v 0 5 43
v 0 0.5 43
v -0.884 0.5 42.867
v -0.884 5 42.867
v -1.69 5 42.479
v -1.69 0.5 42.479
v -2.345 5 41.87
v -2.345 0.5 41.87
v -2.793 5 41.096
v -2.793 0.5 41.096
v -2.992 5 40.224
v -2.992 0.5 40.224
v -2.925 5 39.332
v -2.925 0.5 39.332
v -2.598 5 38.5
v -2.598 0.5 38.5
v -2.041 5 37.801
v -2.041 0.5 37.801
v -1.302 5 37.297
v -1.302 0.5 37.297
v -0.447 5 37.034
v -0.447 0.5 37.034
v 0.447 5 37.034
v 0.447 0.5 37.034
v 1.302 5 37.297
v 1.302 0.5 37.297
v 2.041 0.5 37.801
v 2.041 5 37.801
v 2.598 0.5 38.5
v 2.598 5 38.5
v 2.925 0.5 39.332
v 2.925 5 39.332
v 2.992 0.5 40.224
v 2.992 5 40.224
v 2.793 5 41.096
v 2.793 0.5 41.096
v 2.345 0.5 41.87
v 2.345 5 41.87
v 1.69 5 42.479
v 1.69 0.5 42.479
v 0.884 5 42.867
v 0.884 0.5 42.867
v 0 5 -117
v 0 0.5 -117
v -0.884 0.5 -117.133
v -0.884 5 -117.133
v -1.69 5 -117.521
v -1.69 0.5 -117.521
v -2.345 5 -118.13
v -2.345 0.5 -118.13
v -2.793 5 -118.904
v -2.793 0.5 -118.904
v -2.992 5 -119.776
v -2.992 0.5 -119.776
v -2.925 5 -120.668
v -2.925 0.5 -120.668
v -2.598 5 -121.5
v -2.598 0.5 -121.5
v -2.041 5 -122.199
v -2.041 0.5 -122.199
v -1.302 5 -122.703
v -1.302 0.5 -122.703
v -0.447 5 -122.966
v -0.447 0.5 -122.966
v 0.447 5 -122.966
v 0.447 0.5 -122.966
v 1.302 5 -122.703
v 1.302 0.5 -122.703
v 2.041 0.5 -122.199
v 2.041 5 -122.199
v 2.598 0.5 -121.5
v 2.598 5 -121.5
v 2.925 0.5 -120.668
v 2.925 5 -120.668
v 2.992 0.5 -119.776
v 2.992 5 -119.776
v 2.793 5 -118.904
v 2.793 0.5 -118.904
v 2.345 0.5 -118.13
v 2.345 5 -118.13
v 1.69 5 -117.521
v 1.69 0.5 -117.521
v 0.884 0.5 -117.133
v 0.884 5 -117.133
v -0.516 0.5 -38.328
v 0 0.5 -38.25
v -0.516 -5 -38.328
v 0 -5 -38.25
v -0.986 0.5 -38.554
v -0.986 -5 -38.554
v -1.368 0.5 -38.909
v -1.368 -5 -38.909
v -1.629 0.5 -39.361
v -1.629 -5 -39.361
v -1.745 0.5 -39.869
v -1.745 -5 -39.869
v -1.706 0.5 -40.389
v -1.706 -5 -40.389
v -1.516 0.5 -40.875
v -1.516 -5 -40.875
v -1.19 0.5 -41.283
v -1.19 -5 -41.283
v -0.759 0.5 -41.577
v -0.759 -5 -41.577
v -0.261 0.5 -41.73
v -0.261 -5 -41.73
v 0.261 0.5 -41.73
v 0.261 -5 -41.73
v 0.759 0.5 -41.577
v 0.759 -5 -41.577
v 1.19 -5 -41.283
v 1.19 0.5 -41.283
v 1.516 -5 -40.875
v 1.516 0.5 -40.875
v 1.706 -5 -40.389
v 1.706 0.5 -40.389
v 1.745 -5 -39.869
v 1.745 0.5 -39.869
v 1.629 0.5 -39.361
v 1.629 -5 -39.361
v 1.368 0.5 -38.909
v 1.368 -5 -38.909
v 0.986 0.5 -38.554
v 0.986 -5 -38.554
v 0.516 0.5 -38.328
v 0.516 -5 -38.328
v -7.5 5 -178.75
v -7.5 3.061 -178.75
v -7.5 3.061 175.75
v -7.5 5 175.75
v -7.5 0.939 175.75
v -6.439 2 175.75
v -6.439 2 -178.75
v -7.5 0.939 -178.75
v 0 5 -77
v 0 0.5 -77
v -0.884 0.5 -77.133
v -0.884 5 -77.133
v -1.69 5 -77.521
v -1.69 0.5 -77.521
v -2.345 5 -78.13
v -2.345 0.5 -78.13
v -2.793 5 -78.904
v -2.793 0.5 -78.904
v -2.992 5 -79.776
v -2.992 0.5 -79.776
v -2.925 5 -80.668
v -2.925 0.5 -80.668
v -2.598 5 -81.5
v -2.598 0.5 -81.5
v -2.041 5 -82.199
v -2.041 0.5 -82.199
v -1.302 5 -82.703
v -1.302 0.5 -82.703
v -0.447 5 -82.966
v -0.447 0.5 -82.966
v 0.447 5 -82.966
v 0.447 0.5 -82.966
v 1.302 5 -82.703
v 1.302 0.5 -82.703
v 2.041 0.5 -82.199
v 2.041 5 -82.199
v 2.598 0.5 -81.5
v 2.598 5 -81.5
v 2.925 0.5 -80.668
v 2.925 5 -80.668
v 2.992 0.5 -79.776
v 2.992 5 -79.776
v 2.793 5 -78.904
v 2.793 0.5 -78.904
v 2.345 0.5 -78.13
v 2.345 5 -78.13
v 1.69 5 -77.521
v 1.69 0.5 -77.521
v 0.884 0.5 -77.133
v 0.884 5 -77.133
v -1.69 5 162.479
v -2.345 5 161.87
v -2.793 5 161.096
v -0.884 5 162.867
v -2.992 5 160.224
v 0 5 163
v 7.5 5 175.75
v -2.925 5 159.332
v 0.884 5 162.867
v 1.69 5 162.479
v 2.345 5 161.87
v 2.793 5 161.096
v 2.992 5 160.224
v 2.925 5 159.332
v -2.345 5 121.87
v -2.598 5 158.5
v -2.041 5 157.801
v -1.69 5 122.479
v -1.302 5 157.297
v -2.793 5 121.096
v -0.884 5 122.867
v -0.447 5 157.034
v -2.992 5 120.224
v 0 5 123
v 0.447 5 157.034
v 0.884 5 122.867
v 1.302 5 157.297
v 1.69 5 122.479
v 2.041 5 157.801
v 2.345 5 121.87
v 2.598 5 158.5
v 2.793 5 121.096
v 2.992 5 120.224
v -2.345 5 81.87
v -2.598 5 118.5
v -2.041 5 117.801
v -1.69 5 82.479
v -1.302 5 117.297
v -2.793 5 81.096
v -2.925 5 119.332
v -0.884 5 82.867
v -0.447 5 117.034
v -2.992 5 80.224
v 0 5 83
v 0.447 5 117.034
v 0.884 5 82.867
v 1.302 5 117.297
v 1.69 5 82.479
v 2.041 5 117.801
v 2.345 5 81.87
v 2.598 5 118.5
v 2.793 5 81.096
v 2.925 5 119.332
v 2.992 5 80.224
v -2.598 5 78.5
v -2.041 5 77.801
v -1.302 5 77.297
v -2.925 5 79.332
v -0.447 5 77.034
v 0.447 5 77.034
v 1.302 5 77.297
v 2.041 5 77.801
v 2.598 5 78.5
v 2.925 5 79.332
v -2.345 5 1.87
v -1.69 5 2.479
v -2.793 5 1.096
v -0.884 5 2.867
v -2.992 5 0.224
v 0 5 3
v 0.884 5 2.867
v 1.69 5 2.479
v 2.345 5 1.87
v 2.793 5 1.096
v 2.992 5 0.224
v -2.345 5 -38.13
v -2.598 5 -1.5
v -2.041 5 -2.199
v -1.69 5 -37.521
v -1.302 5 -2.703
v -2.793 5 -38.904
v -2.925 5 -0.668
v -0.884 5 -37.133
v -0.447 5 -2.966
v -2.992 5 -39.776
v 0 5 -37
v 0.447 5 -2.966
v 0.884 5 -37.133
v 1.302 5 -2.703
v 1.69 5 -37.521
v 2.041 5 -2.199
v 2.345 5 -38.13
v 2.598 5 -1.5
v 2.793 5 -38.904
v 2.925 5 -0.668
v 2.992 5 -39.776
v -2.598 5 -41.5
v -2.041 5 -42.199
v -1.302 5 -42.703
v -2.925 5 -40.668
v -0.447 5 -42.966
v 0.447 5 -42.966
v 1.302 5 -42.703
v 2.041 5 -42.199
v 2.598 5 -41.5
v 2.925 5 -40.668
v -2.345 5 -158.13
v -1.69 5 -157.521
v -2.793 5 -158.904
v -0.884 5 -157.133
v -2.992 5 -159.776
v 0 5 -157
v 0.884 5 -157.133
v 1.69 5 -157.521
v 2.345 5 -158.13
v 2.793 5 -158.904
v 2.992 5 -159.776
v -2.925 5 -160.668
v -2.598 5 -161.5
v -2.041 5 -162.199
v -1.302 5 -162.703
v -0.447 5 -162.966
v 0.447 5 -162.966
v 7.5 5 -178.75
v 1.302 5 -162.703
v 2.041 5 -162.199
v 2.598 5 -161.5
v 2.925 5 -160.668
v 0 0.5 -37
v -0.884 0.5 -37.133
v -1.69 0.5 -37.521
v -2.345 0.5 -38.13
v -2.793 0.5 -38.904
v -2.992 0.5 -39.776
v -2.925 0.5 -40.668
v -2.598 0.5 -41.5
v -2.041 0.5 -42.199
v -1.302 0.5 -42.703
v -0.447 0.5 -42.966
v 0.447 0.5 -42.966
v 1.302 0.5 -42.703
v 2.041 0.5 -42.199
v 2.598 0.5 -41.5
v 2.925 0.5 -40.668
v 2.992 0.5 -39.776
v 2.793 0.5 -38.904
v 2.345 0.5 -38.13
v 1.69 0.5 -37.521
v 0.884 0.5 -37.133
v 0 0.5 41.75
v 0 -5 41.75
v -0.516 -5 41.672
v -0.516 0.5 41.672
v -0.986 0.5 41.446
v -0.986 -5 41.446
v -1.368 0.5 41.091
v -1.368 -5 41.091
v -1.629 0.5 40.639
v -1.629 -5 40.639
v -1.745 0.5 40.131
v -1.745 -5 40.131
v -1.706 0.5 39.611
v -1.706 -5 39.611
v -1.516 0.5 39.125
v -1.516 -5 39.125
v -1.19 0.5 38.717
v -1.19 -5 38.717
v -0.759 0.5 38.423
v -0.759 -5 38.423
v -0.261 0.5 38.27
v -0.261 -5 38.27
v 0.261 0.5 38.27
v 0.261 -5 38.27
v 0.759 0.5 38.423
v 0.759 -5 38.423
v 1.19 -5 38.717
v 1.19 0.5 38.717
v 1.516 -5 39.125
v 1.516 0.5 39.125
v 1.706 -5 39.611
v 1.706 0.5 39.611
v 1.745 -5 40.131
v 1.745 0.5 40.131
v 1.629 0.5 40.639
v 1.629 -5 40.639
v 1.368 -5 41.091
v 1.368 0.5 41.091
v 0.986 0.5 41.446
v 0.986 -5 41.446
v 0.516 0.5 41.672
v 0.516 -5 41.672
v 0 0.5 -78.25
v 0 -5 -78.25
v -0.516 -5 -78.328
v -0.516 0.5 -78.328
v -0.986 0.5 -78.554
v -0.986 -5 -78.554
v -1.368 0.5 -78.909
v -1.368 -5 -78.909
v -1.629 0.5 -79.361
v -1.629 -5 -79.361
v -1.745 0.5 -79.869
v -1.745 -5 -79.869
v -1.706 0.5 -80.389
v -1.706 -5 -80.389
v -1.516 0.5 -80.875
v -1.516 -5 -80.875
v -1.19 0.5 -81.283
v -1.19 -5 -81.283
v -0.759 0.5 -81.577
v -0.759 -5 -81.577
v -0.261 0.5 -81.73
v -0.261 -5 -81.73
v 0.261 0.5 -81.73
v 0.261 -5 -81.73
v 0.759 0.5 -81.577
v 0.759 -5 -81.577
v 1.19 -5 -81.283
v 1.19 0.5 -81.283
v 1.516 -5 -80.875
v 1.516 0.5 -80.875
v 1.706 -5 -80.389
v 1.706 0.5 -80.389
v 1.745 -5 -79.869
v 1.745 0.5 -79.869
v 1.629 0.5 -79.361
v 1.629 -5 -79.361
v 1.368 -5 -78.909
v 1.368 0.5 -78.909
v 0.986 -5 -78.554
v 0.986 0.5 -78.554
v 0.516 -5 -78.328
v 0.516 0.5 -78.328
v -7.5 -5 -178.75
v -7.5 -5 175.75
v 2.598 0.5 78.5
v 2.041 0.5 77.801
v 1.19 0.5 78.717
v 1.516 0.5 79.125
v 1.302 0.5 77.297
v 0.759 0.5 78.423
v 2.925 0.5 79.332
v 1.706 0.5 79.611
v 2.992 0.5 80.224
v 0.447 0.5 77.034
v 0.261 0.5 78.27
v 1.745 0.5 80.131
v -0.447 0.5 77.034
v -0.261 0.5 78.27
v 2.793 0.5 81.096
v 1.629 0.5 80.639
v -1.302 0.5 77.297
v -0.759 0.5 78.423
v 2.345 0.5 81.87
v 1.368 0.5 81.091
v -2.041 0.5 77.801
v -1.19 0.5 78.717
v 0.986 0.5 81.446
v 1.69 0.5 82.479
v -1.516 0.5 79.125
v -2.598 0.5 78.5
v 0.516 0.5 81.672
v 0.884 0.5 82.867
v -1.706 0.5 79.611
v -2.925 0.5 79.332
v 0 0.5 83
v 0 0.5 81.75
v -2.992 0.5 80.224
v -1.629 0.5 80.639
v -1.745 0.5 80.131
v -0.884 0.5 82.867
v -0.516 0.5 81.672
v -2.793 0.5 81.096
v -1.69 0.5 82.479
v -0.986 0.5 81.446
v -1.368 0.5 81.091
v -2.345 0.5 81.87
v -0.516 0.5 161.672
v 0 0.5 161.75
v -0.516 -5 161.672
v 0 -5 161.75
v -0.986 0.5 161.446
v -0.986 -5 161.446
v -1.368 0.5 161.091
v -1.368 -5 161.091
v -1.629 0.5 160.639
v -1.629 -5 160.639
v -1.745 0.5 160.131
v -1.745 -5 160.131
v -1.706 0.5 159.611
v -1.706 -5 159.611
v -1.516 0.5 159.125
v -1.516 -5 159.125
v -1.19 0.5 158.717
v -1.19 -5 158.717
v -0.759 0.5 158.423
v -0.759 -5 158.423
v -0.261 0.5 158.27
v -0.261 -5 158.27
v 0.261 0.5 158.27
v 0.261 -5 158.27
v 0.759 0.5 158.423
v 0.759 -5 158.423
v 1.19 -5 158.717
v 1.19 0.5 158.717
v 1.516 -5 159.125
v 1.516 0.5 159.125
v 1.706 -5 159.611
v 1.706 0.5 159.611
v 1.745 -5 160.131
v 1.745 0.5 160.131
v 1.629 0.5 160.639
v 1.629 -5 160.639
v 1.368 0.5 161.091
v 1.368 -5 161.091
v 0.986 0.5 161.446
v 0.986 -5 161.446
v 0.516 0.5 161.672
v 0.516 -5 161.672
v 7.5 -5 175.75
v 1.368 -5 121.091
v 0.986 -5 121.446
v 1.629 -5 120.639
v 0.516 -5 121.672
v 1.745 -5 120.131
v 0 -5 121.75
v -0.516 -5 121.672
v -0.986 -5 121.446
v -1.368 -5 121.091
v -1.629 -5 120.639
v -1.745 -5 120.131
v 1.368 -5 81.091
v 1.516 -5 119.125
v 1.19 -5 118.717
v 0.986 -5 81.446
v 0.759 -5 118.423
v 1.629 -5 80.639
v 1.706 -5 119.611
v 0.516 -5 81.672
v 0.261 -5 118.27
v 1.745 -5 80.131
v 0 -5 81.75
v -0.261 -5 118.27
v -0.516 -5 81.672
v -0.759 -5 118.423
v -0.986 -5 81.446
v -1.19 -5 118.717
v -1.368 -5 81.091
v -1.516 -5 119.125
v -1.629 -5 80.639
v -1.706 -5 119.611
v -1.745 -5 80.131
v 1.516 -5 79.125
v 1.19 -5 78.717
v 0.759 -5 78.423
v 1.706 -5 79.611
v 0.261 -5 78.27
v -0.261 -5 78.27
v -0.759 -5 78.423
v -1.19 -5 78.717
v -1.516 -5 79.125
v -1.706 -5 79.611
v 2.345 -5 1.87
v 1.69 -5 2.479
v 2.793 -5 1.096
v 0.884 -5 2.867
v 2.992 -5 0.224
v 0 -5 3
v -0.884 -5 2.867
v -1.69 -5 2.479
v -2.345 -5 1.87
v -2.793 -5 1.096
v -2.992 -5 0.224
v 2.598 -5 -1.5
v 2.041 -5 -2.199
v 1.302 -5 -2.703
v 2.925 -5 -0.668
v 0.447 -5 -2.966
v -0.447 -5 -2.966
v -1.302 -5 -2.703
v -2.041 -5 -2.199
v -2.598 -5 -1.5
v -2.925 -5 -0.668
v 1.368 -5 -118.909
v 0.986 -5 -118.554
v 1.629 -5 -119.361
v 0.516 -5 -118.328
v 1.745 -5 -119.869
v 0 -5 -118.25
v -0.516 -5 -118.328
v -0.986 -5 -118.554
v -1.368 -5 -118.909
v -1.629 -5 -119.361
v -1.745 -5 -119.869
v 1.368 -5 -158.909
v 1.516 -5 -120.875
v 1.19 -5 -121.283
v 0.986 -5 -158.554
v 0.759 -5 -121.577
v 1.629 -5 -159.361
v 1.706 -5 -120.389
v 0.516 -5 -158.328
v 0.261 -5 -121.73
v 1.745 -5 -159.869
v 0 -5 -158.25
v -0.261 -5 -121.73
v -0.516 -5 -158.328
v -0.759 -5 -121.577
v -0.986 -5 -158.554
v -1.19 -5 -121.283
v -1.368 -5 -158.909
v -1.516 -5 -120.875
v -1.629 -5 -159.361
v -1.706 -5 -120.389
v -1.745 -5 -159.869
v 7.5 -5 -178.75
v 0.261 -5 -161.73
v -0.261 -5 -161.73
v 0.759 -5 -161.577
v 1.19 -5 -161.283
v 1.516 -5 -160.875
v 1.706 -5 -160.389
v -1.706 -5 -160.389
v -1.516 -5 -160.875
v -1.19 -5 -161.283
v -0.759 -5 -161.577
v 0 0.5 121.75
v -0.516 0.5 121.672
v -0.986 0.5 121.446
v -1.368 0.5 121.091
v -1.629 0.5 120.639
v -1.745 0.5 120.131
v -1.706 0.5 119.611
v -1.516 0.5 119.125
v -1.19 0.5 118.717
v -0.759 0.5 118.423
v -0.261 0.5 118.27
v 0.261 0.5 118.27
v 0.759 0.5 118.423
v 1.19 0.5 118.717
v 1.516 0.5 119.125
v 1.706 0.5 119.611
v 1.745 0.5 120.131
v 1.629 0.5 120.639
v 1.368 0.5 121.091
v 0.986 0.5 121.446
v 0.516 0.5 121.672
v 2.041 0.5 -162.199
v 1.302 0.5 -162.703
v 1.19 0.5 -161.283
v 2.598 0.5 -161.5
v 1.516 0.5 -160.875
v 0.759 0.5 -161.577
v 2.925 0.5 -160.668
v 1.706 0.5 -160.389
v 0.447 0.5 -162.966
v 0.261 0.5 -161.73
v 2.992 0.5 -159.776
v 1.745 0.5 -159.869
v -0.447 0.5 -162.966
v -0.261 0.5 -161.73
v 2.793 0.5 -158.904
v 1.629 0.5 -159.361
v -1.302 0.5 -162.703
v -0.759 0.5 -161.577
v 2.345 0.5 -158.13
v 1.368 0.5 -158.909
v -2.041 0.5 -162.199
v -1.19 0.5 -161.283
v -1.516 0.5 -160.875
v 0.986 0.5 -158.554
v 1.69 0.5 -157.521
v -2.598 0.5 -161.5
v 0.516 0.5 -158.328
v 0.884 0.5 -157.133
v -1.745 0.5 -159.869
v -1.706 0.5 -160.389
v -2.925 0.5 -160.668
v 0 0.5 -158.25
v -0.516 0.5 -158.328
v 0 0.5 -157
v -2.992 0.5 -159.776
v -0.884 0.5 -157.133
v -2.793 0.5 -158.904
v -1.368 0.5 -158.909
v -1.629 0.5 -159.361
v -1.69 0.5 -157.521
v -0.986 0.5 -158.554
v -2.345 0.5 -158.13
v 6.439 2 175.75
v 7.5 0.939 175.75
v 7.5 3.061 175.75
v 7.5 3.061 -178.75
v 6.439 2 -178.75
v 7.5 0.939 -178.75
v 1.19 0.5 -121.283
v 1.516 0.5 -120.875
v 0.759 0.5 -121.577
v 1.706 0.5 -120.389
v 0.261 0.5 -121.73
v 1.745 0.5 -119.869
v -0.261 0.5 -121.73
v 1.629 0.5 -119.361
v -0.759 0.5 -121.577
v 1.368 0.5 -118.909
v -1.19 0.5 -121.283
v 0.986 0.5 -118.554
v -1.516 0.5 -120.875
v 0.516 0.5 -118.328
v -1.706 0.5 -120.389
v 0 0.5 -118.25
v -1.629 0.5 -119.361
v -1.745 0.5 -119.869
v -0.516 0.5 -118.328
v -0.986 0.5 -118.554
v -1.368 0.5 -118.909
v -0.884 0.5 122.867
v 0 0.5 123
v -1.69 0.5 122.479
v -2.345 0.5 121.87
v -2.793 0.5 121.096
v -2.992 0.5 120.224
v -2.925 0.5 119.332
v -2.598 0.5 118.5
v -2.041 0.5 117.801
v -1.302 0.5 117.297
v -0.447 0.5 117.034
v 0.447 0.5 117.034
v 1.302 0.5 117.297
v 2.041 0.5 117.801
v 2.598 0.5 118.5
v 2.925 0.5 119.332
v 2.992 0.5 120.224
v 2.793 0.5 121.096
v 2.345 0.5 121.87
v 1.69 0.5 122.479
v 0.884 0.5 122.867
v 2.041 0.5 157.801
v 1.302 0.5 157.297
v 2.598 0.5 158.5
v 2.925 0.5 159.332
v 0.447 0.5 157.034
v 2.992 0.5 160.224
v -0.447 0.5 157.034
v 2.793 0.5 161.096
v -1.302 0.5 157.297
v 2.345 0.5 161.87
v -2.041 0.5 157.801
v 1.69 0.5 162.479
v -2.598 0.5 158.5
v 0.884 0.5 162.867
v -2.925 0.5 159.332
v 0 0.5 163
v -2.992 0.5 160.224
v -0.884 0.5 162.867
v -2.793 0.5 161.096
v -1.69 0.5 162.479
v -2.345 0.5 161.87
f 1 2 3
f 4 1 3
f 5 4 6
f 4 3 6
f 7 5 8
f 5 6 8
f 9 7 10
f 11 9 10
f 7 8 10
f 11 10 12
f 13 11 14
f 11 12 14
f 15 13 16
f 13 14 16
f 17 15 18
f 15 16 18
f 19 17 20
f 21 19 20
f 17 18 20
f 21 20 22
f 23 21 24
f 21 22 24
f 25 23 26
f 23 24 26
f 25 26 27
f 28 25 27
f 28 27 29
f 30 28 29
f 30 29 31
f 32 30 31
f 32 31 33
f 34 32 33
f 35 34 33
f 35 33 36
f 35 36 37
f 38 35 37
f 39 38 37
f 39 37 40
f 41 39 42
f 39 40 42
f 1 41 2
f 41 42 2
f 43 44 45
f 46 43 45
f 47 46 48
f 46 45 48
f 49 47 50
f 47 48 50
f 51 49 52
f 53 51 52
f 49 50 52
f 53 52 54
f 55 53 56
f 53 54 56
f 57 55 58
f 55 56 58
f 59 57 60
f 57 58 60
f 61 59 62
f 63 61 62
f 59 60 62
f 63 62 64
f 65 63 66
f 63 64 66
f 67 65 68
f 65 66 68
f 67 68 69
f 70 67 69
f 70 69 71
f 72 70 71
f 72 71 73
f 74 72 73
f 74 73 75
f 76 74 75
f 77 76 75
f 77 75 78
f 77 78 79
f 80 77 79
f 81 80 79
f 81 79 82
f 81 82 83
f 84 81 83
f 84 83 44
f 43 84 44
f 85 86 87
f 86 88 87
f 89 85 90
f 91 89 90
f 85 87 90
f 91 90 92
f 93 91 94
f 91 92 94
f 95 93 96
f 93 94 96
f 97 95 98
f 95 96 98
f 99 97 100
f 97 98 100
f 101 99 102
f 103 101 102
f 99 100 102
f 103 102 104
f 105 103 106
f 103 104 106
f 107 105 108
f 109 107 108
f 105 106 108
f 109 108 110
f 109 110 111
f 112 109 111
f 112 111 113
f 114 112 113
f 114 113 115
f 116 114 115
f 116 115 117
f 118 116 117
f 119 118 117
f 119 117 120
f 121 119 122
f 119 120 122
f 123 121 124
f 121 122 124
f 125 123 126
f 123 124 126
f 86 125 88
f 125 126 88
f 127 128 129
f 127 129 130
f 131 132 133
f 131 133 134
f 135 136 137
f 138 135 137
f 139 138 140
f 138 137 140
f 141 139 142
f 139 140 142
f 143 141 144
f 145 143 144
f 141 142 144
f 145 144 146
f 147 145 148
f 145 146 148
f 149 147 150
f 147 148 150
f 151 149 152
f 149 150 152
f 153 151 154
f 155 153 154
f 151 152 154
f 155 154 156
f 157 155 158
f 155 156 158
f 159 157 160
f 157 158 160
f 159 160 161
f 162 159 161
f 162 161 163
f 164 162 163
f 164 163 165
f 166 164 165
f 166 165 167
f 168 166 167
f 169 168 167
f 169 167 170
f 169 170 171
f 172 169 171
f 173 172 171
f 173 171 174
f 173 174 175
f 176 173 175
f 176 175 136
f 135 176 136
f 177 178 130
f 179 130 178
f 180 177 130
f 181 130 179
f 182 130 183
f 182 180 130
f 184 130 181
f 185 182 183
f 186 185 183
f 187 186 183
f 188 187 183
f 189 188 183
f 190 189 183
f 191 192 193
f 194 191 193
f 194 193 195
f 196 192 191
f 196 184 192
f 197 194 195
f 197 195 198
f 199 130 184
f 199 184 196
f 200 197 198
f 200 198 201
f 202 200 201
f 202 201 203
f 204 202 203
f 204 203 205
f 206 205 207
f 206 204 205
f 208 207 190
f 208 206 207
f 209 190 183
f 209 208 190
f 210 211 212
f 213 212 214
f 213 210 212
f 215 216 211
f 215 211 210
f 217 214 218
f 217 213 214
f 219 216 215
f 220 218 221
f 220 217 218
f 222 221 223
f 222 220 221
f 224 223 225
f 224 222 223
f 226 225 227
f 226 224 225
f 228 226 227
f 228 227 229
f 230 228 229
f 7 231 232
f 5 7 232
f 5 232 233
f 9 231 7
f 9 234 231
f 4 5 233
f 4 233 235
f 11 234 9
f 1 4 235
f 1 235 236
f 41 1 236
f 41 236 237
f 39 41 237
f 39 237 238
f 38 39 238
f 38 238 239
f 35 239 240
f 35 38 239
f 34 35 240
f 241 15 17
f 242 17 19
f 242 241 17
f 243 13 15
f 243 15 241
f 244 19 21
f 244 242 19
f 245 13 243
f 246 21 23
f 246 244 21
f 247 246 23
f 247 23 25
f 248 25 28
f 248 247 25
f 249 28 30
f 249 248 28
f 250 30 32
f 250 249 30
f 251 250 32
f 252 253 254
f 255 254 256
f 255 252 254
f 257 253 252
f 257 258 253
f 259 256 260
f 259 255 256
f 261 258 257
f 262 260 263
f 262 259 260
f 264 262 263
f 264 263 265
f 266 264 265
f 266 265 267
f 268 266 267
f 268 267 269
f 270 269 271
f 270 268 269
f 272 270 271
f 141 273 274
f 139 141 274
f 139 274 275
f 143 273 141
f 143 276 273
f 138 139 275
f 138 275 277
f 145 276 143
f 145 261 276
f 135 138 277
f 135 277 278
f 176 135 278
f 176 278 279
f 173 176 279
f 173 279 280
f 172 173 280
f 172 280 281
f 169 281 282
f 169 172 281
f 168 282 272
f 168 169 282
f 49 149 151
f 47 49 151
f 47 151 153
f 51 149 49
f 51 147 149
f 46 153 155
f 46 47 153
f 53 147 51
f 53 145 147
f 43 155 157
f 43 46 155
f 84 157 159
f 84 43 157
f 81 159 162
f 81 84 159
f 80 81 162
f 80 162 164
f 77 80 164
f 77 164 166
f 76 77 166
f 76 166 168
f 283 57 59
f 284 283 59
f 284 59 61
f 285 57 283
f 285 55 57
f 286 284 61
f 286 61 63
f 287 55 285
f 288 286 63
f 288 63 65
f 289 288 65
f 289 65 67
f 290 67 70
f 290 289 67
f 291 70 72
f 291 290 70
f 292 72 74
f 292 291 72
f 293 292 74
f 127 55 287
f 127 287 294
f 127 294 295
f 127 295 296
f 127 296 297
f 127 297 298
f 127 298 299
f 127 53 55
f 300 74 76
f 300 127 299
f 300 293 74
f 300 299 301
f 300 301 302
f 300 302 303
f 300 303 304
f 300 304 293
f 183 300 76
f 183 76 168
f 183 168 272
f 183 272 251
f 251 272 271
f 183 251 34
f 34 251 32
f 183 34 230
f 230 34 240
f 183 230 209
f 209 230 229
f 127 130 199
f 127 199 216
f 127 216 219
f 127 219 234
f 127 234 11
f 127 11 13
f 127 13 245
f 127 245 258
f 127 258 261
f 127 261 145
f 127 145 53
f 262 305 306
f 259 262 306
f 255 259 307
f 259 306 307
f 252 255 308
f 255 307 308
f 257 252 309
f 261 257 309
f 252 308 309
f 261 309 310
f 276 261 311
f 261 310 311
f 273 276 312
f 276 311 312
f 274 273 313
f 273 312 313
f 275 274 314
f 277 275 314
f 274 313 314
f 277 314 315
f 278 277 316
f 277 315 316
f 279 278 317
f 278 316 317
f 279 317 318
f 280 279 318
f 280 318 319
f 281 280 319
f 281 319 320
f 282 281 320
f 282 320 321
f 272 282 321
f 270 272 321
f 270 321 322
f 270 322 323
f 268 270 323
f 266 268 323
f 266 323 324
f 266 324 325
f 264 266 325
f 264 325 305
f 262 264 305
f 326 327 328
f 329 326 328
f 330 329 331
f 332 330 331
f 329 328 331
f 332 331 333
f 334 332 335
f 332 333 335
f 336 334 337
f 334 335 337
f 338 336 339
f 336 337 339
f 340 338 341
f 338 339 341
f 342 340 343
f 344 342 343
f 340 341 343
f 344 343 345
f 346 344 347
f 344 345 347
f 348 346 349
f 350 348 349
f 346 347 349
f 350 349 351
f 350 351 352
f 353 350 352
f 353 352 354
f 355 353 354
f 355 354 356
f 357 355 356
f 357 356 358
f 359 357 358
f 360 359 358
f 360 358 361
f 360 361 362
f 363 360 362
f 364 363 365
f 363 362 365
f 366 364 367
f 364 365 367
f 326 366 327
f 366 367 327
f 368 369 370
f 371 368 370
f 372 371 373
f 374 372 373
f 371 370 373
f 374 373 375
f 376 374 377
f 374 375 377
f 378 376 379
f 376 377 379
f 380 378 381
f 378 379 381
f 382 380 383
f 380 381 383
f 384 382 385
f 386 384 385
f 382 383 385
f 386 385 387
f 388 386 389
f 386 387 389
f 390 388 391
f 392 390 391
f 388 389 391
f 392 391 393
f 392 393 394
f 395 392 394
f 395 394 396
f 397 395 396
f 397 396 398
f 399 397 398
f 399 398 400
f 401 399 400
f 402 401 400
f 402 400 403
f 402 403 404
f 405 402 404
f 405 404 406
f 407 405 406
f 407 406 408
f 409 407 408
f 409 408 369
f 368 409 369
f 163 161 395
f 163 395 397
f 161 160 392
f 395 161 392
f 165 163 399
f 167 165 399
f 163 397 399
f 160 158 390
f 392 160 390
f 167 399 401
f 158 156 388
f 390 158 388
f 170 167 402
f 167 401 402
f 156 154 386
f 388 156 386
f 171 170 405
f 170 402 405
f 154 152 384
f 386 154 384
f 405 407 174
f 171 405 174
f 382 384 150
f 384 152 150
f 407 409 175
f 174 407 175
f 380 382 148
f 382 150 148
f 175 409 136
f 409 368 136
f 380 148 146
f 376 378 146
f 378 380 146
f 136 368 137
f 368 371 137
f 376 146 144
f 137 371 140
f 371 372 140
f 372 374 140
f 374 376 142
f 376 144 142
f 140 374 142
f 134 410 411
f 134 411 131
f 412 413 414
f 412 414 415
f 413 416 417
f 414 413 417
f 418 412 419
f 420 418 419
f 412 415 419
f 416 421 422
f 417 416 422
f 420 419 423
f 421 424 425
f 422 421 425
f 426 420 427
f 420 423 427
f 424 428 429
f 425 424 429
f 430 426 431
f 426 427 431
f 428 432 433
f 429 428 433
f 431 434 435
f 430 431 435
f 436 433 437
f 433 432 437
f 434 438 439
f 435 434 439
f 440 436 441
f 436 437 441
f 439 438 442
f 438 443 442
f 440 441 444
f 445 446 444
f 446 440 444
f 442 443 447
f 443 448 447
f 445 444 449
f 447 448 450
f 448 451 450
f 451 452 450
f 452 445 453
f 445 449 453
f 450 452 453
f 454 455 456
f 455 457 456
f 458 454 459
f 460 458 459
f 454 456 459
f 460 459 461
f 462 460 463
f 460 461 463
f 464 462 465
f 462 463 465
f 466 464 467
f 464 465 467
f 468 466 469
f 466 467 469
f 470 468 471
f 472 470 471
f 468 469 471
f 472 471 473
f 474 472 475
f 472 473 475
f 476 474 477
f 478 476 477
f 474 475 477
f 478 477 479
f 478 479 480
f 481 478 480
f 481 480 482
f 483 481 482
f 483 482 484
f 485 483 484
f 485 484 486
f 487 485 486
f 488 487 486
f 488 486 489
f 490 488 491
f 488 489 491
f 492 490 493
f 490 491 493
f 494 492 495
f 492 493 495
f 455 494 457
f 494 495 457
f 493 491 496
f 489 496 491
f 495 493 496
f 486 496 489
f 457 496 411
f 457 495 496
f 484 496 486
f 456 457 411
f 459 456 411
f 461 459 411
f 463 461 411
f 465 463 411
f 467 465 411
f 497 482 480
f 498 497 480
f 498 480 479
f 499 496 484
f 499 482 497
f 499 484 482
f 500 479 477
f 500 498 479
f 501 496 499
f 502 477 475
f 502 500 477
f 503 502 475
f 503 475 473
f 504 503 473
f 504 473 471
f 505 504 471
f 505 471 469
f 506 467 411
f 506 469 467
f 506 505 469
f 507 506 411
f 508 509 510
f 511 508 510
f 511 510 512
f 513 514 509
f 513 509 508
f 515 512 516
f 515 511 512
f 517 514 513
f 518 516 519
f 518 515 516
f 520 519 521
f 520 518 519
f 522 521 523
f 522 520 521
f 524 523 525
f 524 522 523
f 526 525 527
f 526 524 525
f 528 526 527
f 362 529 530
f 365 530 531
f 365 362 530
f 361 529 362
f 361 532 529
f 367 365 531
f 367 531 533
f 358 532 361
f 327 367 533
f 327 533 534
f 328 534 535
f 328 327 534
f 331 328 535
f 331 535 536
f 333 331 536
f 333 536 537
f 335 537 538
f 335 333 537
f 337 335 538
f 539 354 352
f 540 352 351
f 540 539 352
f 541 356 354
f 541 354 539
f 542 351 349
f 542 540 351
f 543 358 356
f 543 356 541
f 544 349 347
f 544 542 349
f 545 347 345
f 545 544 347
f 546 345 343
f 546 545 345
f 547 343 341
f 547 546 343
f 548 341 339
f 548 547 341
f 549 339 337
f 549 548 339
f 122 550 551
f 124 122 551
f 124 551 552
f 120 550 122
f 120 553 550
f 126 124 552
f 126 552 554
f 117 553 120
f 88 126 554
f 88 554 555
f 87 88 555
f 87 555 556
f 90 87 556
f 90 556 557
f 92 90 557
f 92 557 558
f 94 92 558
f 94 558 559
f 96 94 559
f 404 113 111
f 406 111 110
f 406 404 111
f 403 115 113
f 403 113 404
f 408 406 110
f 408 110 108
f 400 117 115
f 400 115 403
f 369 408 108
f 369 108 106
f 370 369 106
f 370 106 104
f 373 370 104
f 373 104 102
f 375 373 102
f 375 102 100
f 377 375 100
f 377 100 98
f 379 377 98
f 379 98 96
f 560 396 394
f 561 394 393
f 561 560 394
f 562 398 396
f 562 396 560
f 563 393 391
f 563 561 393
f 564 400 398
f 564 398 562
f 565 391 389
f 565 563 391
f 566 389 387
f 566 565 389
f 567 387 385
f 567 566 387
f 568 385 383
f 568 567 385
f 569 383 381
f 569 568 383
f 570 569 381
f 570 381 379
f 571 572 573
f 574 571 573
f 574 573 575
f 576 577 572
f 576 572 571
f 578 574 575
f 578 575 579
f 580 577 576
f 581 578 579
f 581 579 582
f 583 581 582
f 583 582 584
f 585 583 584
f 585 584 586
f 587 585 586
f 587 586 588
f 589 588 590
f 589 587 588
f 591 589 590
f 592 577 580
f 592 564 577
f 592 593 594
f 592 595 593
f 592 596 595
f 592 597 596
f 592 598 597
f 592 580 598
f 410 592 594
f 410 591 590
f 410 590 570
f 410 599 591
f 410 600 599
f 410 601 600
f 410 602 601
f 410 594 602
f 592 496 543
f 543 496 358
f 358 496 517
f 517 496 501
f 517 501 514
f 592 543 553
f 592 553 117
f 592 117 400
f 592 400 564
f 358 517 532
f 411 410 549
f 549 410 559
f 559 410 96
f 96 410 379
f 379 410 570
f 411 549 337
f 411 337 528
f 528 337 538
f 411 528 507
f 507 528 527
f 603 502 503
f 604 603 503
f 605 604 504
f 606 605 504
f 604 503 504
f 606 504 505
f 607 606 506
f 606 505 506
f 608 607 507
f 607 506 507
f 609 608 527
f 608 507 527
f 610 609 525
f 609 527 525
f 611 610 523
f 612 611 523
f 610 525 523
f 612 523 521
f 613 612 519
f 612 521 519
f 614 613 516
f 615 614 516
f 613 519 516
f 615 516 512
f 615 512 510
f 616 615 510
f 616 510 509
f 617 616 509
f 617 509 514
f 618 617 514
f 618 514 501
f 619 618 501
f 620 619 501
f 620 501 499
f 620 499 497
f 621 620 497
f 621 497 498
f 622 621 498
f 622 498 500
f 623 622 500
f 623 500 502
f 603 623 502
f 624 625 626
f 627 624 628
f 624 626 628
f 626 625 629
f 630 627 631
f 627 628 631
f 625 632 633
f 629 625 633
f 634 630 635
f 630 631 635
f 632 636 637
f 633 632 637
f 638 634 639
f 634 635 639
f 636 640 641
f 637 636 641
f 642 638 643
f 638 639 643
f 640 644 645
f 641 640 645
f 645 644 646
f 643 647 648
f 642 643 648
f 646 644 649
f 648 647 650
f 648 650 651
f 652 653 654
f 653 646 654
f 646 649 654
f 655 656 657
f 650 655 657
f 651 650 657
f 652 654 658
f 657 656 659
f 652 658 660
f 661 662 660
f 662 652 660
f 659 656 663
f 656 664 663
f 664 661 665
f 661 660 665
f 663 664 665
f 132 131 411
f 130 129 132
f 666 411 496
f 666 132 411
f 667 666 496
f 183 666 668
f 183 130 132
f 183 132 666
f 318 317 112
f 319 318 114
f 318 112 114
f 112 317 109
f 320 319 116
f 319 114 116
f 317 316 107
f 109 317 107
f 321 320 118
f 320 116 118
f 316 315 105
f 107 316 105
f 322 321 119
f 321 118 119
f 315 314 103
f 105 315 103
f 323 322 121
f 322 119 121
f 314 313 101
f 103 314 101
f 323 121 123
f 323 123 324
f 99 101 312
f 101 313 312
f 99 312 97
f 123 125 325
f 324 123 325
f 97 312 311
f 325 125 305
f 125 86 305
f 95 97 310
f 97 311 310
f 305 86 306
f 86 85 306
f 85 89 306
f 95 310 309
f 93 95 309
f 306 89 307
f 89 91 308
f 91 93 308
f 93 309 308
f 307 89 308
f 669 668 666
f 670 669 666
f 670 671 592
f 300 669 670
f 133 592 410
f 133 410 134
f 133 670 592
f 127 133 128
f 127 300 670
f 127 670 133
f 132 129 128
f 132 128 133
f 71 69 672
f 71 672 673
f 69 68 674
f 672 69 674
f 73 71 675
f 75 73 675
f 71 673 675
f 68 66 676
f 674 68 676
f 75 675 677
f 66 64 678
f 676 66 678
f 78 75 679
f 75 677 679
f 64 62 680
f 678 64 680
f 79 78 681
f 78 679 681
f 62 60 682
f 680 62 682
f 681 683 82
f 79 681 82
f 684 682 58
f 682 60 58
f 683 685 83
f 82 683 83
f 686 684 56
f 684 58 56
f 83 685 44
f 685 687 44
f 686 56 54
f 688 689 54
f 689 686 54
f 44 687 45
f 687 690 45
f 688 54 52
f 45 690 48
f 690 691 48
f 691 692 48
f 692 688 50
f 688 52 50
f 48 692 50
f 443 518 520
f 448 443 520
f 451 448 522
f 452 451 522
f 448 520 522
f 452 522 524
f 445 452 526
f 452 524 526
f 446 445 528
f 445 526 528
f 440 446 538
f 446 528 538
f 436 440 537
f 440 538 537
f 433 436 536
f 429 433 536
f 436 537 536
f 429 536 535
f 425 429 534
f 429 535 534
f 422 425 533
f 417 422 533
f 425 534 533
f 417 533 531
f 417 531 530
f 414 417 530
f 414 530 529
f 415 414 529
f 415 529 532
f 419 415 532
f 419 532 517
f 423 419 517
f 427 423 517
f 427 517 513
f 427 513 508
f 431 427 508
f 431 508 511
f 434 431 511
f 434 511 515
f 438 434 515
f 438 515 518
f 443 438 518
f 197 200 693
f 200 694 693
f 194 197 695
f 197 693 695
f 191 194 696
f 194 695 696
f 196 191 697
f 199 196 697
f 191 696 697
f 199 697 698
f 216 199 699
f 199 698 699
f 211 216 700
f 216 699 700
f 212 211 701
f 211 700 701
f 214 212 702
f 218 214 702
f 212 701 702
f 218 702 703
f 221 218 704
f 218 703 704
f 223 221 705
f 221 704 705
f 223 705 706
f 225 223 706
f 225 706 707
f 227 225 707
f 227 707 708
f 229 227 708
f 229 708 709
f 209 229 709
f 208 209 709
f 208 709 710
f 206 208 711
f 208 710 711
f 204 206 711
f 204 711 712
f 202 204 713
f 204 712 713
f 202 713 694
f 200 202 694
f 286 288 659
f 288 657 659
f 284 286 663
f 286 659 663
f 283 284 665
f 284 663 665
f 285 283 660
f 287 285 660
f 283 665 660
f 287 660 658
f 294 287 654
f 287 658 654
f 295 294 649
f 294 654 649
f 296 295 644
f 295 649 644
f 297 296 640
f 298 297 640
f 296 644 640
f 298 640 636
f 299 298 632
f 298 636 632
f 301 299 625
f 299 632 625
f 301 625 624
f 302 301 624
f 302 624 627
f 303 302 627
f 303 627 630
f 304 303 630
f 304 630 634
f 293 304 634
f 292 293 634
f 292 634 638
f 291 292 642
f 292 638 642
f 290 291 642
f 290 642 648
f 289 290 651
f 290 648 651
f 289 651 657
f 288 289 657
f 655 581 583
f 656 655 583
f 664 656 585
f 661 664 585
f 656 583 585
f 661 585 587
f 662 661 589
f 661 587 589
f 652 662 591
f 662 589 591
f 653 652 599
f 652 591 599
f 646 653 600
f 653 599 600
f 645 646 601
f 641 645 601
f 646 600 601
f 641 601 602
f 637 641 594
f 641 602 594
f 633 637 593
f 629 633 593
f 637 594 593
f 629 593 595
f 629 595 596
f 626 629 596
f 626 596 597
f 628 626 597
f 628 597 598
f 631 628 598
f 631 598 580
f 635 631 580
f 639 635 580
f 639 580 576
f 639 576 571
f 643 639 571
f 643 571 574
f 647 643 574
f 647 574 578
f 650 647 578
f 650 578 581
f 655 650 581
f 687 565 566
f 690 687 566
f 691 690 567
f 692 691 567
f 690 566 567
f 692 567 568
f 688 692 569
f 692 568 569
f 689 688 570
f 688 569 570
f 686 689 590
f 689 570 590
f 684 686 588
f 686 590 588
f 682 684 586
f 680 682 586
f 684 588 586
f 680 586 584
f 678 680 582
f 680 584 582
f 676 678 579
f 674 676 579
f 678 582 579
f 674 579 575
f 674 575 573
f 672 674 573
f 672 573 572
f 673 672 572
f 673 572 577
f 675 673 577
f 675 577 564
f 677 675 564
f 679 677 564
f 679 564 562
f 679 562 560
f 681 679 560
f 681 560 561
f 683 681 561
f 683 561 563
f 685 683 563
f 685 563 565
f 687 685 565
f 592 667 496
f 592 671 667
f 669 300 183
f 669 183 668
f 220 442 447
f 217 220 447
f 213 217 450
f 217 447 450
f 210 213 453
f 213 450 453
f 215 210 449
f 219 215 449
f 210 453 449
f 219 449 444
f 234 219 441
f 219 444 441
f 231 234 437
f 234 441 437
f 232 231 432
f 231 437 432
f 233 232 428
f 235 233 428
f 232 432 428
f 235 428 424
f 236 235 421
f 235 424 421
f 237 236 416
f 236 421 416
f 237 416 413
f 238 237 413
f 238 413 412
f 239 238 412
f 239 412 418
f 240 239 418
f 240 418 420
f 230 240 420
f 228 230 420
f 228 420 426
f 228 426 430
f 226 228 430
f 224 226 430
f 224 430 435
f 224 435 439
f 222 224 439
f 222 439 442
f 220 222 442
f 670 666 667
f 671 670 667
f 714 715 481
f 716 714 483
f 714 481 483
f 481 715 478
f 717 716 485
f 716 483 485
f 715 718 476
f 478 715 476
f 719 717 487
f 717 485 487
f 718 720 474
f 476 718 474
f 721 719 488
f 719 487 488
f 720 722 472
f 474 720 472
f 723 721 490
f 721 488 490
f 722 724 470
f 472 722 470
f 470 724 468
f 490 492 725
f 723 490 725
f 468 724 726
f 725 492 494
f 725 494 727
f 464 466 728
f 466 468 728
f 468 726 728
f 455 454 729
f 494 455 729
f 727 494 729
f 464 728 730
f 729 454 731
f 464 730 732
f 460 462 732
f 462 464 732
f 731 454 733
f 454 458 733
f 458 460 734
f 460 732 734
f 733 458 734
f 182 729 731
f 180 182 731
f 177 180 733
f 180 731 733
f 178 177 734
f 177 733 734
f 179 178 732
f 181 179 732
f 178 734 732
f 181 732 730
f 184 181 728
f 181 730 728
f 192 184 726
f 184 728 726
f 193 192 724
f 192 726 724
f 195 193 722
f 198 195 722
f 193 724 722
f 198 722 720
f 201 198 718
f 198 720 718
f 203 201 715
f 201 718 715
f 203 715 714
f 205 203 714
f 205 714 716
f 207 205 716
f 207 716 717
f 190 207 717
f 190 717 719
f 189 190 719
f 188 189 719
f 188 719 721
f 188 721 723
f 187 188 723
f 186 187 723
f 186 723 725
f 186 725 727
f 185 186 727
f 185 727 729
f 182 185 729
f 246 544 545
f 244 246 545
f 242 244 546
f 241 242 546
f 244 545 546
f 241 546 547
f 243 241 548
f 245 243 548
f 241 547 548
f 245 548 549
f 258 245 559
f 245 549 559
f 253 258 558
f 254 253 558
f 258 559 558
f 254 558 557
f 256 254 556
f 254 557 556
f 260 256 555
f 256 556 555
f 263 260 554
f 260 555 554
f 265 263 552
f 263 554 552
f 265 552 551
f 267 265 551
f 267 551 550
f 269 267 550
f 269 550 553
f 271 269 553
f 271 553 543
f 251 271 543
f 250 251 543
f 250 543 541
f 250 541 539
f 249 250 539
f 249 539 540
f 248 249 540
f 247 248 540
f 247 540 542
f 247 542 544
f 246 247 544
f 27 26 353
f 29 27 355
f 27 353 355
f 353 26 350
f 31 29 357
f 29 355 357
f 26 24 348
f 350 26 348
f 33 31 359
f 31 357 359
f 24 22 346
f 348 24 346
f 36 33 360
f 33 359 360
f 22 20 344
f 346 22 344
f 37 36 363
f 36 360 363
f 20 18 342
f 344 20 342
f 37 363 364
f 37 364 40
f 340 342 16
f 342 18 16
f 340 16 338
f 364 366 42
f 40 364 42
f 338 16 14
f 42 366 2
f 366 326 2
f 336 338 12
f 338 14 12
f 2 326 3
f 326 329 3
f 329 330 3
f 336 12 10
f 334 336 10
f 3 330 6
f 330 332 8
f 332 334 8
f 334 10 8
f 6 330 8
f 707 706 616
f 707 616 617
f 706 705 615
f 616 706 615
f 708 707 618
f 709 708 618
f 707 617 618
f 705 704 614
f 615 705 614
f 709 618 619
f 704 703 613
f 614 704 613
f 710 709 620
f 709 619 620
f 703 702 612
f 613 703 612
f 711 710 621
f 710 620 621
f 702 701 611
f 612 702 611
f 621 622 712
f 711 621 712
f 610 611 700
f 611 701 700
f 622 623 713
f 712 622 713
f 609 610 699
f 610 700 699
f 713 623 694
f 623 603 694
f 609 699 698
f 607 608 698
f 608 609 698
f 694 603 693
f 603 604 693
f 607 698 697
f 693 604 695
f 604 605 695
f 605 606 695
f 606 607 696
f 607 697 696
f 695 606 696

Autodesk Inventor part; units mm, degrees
ref_plane "YZ Plane" through (0, 0, 0) normal (1, 0, 0) x (0, 1, 0)
ref_plane "XZ Plane" through (0, 0, 0) normal (0, 1, 0) x (-1, 0, 0)
ref_plane "XY Plane" through (0, 0, 0) normal (0, 0, 1) x (1, 0, 0)
sketch "Sketch1" plane through (0, 0, 0) normal (0, 0, 1) x (1, 0, 0)
  line L0 (-7.5, 5) -> (7.5, 5)
  line L1 (7.5, 5) -> (7.5, -5)
  line L2 (7.5, -5) -> (-7.5, -5)
  line L3 (-7.5, -5) -> (-7.5, 5)
  line L4 (-7.5, 5) -> (7.5, -5) construction
  line L5 (7.5, 5) -> (-7.5, -5) construction
  line L6 (-7.5, 3.0607) -> (-6.4393, 2)
  line L7 (-7.5, 3.0607) -> (-6, 3.0607) construction
  line L8 (-6.4393, 2) -> (-7.5, 0.9393)
  line L9 (0, 5) -> (0, -5) construction
  line L10 (7.5, 3.0607) -> (6.4393, 2)
  line L11 (6.4393, 2) -> (7.5, 0.9393)
  point P0 (0, 0)
  point P1 (7.5, 0.9393)
  point P2 (7.5, 3.0607)
  dimension "d0" = 15
  dimension "d1" = 10
  dimension "d2" = 45
  dimension "d3" = 3
  dimension "d4" = 1.5
extrude "Extrusion1" add sketch "Sketch1" along normal mid plane 360 contours L0 L1 L10 L11 L2 L3 L8 L6
sketch "Sketch2" plane through (-7.5, 5, 180) normal (0, 1, 0) x (1, 0, 0)
  point P0 (7.5, 180)
  point P1 (7.5, 180)
hole "Hole1" at (0, 5, 0) direction (0, -1, 0) diameter 3.5 end through all counterbore diameter 6 counterbore depth 4.5
pattern_linear "Rectangular Pattern1" count 9 spacing 40 along (0, 0, 1) of "Hole1" first direction both ways yes
sketch "Sketch3" plane through (-7.5, 5, 180) normal (0, 1, 0) x (1, 0, 0)
  point P0 (7.5, 180)
  point P1 (7.5, 180)
hole "Hole2" at (0, 5, 0) direction (0, -1, 0) diameter 6 end through all
sketch "Sketch4" plane through (0, 0, 180) normal (0, 0, 1) x (1, 0, 0)
  line L0 (-7.5, 5) -> (-7.5, 3.0607) projected
  line L1 (-7.5, 3.0607) -> (-6.4393, 2) projected
  line L2 (-6.4393, 2) -> (-7.5, 0.9393) projected
  line L3 (-7.5, 0.9393) -> (-7.5, -5) projected
  line L4 (-7.5, -5) -> (7.5, -5) projected
  line L5 (7.5, -5) -> (7.5, 0.9393) projected
  line L6 (7.5, 0.9393) -> (6.4393, 2) projected
  line L7 (6.4393, 2) -> (7.5, 3.0607) projected
  line L8 (7.5, 3.0607) -> (7.5, 5) projected
  line L9 (7.5, 5) -> (-7.5, 5) projected
  point P0 (0, 0)
extrude "Extrusion2" cut sketch "Sketch4" against normal blind 4.25
sketch "Sketch5" plane through (0, 0, -180) normal (0, 0, -1) x (-1, 0, 0)
  line L0 (7.5, 3.0607) -> (7.5, 5) projected
  line L1 (7.5, 5) -> (-7.5, 5) projected
  line L2 (-7.5, 5) -> (-7.5, 3.0607) projected
  line L3 (-7.5, 3.0607) -> (-6.4393, 2) projected
  line L4 (-6.4393, 2) -> (-7.5, 0.9393) projected
  line L5 (-7.5, 0.9393) -> (-7.5, -5) projected
  line L6 (-7.5, -5) -> (7.5, -5) projected
  line L7 (7.5, -5) -> (7.5, 0.9393) projected
  line L8 (7.5, 0.9393) -> (6.4393, 2) projected
  line L9 (6.4393, 2) -> (7.5, 3.0607) projected
  point P0 (0, 0)
extrude "Extrusion3" cut sketch "Sketch5" against normal blind 1.25
properties part number "MGN15 Rail" material "Stainless Steel, 440C"
